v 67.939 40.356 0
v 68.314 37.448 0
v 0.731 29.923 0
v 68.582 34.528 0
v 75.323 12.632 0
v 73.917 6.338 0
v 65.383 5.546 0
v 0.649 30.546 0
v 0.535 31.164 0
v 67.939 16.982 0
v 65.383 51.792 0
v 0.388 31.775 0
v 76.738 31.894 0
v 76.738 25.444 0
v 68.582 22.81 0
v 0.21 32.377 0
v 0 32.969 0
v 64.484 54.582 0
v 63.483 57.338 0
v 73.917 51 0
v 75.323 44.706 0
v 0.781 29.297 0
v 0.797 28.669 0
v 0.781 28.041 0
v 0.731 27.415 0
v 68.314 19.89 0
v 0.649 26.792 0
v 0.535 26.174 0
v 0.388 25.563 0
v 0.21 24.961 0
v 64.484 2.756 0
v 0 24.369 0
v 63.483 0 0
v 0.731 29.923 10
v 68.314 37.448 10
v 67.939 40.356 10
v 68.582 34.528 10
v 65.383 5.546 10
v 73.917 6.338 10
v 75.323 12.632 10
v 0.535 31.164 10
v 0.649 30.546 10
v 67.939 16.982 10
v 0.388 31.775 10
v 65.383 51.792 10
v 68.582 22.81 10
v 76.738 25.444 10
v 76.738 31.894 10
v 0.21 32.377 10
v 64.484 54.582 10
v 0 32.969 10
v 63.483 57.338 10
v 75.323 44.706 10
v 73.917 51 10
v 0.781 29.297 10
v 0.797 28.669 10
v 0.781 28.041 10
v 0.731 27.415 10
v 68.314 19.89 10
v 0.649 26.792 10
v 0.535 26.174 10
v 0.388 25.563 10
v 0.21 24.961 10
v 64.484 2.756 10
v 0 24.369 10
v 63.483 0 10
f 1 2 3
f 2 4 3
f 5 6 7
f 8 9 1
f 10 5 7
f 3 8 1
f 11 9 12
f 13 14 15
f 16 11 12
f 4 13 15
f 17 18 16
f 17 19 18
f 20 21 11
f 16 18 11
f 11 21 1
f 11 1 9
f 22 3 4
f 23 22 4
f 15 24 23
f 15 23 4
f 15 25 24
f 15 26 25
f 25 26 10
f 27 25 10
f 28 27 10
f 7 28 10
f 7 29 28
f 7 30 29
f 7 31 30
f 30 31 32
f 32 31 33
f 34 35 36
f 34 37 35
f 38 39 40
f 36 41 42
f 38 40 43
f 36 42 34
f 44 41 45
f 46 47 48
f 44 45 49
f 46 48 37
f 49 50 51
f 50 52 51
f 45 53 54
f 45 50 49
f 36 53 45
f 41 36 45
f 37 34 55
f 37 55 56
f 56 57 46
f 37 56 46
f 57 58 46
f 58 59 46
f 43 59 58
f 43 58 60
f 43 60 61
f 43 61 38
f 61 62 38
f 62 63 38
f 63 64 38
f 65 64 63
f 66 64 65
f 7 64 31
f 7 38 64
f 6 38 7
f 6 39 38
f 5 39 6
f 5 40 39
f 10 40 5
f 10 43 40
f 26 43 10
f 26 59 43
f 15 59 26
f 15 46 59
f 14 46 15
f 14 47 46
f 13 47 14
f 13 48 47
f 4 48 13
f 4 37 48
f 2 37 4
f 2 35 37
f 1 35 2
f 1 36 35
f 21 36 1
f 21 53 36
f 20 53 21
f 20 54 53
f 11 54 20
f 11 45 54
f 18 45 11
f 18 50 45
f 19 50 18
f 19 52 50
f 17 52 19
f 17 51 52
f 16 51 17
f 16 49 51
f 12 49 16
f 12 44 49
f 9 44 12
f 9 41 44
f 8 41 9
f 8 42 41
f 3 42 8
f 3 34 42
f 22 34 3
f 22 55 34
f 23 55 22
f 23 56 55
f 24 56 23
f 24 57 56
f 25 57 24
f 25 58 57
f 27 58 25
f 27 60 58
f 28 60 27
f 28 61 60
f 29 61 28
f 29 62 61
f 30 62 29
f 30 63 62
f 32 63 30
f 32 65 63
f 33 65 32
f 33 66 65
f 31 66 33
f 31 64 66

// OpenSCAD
$fn = 32;

// ----------------------------------------------------------------------
// Gear sector: 3 teeth on 42 degrees
// ----------------------------------------------------------------------

// --- parameters (mm) ---
sector_angle = 42;        // sector angle, degrees
root_r = 80;              // root circle radius
tooth_h = 8;              // tooth height over the root circle
teeth = 3;                // number of teeth on the sector
hub_r = 12;               // hub bore radius
plate_t = 10;             // sector thickness, Z
arc_step = 3;             // sampling step of the root/hub arcs, degrees

tip_r = root_r + tooth_h;  // tip circle radius

profile = [[63.483, 0], [64.484, 2.756], [65.383, 5.546], [73.917, 6.338], [75.323, 12.632], [67.939, 16.982], [68.314, 19.89], [68.582, 22.81], [76.738, 25.444], [76.738, 31.894], [68.582, 34.528], [68.314, 37.448], [67.939, 40.356], [75.323, 44.706], [73.917, 51], [65.383, 51.792], [64.484, 54.582], [63.483, 57.338], [0, 32.969], [0.21, 32.377], [0.388, 31.775], [0.535, 31.164], [0.649, 30.546], [0.731, 29.923], [0.781, 29.297], [0.797, 28.669], [0.781, 28.041], [0.731, 27.415], [0.649, 26.792], [0.535, 26.174], [0.388, 25.563], [0.21, 24.961], [0, 24.369]];  // primary outline, 33 points, counter clockwise

// --- the one profile operation ---
linear_extrude(height = plate_t) polygon(points = profile);
